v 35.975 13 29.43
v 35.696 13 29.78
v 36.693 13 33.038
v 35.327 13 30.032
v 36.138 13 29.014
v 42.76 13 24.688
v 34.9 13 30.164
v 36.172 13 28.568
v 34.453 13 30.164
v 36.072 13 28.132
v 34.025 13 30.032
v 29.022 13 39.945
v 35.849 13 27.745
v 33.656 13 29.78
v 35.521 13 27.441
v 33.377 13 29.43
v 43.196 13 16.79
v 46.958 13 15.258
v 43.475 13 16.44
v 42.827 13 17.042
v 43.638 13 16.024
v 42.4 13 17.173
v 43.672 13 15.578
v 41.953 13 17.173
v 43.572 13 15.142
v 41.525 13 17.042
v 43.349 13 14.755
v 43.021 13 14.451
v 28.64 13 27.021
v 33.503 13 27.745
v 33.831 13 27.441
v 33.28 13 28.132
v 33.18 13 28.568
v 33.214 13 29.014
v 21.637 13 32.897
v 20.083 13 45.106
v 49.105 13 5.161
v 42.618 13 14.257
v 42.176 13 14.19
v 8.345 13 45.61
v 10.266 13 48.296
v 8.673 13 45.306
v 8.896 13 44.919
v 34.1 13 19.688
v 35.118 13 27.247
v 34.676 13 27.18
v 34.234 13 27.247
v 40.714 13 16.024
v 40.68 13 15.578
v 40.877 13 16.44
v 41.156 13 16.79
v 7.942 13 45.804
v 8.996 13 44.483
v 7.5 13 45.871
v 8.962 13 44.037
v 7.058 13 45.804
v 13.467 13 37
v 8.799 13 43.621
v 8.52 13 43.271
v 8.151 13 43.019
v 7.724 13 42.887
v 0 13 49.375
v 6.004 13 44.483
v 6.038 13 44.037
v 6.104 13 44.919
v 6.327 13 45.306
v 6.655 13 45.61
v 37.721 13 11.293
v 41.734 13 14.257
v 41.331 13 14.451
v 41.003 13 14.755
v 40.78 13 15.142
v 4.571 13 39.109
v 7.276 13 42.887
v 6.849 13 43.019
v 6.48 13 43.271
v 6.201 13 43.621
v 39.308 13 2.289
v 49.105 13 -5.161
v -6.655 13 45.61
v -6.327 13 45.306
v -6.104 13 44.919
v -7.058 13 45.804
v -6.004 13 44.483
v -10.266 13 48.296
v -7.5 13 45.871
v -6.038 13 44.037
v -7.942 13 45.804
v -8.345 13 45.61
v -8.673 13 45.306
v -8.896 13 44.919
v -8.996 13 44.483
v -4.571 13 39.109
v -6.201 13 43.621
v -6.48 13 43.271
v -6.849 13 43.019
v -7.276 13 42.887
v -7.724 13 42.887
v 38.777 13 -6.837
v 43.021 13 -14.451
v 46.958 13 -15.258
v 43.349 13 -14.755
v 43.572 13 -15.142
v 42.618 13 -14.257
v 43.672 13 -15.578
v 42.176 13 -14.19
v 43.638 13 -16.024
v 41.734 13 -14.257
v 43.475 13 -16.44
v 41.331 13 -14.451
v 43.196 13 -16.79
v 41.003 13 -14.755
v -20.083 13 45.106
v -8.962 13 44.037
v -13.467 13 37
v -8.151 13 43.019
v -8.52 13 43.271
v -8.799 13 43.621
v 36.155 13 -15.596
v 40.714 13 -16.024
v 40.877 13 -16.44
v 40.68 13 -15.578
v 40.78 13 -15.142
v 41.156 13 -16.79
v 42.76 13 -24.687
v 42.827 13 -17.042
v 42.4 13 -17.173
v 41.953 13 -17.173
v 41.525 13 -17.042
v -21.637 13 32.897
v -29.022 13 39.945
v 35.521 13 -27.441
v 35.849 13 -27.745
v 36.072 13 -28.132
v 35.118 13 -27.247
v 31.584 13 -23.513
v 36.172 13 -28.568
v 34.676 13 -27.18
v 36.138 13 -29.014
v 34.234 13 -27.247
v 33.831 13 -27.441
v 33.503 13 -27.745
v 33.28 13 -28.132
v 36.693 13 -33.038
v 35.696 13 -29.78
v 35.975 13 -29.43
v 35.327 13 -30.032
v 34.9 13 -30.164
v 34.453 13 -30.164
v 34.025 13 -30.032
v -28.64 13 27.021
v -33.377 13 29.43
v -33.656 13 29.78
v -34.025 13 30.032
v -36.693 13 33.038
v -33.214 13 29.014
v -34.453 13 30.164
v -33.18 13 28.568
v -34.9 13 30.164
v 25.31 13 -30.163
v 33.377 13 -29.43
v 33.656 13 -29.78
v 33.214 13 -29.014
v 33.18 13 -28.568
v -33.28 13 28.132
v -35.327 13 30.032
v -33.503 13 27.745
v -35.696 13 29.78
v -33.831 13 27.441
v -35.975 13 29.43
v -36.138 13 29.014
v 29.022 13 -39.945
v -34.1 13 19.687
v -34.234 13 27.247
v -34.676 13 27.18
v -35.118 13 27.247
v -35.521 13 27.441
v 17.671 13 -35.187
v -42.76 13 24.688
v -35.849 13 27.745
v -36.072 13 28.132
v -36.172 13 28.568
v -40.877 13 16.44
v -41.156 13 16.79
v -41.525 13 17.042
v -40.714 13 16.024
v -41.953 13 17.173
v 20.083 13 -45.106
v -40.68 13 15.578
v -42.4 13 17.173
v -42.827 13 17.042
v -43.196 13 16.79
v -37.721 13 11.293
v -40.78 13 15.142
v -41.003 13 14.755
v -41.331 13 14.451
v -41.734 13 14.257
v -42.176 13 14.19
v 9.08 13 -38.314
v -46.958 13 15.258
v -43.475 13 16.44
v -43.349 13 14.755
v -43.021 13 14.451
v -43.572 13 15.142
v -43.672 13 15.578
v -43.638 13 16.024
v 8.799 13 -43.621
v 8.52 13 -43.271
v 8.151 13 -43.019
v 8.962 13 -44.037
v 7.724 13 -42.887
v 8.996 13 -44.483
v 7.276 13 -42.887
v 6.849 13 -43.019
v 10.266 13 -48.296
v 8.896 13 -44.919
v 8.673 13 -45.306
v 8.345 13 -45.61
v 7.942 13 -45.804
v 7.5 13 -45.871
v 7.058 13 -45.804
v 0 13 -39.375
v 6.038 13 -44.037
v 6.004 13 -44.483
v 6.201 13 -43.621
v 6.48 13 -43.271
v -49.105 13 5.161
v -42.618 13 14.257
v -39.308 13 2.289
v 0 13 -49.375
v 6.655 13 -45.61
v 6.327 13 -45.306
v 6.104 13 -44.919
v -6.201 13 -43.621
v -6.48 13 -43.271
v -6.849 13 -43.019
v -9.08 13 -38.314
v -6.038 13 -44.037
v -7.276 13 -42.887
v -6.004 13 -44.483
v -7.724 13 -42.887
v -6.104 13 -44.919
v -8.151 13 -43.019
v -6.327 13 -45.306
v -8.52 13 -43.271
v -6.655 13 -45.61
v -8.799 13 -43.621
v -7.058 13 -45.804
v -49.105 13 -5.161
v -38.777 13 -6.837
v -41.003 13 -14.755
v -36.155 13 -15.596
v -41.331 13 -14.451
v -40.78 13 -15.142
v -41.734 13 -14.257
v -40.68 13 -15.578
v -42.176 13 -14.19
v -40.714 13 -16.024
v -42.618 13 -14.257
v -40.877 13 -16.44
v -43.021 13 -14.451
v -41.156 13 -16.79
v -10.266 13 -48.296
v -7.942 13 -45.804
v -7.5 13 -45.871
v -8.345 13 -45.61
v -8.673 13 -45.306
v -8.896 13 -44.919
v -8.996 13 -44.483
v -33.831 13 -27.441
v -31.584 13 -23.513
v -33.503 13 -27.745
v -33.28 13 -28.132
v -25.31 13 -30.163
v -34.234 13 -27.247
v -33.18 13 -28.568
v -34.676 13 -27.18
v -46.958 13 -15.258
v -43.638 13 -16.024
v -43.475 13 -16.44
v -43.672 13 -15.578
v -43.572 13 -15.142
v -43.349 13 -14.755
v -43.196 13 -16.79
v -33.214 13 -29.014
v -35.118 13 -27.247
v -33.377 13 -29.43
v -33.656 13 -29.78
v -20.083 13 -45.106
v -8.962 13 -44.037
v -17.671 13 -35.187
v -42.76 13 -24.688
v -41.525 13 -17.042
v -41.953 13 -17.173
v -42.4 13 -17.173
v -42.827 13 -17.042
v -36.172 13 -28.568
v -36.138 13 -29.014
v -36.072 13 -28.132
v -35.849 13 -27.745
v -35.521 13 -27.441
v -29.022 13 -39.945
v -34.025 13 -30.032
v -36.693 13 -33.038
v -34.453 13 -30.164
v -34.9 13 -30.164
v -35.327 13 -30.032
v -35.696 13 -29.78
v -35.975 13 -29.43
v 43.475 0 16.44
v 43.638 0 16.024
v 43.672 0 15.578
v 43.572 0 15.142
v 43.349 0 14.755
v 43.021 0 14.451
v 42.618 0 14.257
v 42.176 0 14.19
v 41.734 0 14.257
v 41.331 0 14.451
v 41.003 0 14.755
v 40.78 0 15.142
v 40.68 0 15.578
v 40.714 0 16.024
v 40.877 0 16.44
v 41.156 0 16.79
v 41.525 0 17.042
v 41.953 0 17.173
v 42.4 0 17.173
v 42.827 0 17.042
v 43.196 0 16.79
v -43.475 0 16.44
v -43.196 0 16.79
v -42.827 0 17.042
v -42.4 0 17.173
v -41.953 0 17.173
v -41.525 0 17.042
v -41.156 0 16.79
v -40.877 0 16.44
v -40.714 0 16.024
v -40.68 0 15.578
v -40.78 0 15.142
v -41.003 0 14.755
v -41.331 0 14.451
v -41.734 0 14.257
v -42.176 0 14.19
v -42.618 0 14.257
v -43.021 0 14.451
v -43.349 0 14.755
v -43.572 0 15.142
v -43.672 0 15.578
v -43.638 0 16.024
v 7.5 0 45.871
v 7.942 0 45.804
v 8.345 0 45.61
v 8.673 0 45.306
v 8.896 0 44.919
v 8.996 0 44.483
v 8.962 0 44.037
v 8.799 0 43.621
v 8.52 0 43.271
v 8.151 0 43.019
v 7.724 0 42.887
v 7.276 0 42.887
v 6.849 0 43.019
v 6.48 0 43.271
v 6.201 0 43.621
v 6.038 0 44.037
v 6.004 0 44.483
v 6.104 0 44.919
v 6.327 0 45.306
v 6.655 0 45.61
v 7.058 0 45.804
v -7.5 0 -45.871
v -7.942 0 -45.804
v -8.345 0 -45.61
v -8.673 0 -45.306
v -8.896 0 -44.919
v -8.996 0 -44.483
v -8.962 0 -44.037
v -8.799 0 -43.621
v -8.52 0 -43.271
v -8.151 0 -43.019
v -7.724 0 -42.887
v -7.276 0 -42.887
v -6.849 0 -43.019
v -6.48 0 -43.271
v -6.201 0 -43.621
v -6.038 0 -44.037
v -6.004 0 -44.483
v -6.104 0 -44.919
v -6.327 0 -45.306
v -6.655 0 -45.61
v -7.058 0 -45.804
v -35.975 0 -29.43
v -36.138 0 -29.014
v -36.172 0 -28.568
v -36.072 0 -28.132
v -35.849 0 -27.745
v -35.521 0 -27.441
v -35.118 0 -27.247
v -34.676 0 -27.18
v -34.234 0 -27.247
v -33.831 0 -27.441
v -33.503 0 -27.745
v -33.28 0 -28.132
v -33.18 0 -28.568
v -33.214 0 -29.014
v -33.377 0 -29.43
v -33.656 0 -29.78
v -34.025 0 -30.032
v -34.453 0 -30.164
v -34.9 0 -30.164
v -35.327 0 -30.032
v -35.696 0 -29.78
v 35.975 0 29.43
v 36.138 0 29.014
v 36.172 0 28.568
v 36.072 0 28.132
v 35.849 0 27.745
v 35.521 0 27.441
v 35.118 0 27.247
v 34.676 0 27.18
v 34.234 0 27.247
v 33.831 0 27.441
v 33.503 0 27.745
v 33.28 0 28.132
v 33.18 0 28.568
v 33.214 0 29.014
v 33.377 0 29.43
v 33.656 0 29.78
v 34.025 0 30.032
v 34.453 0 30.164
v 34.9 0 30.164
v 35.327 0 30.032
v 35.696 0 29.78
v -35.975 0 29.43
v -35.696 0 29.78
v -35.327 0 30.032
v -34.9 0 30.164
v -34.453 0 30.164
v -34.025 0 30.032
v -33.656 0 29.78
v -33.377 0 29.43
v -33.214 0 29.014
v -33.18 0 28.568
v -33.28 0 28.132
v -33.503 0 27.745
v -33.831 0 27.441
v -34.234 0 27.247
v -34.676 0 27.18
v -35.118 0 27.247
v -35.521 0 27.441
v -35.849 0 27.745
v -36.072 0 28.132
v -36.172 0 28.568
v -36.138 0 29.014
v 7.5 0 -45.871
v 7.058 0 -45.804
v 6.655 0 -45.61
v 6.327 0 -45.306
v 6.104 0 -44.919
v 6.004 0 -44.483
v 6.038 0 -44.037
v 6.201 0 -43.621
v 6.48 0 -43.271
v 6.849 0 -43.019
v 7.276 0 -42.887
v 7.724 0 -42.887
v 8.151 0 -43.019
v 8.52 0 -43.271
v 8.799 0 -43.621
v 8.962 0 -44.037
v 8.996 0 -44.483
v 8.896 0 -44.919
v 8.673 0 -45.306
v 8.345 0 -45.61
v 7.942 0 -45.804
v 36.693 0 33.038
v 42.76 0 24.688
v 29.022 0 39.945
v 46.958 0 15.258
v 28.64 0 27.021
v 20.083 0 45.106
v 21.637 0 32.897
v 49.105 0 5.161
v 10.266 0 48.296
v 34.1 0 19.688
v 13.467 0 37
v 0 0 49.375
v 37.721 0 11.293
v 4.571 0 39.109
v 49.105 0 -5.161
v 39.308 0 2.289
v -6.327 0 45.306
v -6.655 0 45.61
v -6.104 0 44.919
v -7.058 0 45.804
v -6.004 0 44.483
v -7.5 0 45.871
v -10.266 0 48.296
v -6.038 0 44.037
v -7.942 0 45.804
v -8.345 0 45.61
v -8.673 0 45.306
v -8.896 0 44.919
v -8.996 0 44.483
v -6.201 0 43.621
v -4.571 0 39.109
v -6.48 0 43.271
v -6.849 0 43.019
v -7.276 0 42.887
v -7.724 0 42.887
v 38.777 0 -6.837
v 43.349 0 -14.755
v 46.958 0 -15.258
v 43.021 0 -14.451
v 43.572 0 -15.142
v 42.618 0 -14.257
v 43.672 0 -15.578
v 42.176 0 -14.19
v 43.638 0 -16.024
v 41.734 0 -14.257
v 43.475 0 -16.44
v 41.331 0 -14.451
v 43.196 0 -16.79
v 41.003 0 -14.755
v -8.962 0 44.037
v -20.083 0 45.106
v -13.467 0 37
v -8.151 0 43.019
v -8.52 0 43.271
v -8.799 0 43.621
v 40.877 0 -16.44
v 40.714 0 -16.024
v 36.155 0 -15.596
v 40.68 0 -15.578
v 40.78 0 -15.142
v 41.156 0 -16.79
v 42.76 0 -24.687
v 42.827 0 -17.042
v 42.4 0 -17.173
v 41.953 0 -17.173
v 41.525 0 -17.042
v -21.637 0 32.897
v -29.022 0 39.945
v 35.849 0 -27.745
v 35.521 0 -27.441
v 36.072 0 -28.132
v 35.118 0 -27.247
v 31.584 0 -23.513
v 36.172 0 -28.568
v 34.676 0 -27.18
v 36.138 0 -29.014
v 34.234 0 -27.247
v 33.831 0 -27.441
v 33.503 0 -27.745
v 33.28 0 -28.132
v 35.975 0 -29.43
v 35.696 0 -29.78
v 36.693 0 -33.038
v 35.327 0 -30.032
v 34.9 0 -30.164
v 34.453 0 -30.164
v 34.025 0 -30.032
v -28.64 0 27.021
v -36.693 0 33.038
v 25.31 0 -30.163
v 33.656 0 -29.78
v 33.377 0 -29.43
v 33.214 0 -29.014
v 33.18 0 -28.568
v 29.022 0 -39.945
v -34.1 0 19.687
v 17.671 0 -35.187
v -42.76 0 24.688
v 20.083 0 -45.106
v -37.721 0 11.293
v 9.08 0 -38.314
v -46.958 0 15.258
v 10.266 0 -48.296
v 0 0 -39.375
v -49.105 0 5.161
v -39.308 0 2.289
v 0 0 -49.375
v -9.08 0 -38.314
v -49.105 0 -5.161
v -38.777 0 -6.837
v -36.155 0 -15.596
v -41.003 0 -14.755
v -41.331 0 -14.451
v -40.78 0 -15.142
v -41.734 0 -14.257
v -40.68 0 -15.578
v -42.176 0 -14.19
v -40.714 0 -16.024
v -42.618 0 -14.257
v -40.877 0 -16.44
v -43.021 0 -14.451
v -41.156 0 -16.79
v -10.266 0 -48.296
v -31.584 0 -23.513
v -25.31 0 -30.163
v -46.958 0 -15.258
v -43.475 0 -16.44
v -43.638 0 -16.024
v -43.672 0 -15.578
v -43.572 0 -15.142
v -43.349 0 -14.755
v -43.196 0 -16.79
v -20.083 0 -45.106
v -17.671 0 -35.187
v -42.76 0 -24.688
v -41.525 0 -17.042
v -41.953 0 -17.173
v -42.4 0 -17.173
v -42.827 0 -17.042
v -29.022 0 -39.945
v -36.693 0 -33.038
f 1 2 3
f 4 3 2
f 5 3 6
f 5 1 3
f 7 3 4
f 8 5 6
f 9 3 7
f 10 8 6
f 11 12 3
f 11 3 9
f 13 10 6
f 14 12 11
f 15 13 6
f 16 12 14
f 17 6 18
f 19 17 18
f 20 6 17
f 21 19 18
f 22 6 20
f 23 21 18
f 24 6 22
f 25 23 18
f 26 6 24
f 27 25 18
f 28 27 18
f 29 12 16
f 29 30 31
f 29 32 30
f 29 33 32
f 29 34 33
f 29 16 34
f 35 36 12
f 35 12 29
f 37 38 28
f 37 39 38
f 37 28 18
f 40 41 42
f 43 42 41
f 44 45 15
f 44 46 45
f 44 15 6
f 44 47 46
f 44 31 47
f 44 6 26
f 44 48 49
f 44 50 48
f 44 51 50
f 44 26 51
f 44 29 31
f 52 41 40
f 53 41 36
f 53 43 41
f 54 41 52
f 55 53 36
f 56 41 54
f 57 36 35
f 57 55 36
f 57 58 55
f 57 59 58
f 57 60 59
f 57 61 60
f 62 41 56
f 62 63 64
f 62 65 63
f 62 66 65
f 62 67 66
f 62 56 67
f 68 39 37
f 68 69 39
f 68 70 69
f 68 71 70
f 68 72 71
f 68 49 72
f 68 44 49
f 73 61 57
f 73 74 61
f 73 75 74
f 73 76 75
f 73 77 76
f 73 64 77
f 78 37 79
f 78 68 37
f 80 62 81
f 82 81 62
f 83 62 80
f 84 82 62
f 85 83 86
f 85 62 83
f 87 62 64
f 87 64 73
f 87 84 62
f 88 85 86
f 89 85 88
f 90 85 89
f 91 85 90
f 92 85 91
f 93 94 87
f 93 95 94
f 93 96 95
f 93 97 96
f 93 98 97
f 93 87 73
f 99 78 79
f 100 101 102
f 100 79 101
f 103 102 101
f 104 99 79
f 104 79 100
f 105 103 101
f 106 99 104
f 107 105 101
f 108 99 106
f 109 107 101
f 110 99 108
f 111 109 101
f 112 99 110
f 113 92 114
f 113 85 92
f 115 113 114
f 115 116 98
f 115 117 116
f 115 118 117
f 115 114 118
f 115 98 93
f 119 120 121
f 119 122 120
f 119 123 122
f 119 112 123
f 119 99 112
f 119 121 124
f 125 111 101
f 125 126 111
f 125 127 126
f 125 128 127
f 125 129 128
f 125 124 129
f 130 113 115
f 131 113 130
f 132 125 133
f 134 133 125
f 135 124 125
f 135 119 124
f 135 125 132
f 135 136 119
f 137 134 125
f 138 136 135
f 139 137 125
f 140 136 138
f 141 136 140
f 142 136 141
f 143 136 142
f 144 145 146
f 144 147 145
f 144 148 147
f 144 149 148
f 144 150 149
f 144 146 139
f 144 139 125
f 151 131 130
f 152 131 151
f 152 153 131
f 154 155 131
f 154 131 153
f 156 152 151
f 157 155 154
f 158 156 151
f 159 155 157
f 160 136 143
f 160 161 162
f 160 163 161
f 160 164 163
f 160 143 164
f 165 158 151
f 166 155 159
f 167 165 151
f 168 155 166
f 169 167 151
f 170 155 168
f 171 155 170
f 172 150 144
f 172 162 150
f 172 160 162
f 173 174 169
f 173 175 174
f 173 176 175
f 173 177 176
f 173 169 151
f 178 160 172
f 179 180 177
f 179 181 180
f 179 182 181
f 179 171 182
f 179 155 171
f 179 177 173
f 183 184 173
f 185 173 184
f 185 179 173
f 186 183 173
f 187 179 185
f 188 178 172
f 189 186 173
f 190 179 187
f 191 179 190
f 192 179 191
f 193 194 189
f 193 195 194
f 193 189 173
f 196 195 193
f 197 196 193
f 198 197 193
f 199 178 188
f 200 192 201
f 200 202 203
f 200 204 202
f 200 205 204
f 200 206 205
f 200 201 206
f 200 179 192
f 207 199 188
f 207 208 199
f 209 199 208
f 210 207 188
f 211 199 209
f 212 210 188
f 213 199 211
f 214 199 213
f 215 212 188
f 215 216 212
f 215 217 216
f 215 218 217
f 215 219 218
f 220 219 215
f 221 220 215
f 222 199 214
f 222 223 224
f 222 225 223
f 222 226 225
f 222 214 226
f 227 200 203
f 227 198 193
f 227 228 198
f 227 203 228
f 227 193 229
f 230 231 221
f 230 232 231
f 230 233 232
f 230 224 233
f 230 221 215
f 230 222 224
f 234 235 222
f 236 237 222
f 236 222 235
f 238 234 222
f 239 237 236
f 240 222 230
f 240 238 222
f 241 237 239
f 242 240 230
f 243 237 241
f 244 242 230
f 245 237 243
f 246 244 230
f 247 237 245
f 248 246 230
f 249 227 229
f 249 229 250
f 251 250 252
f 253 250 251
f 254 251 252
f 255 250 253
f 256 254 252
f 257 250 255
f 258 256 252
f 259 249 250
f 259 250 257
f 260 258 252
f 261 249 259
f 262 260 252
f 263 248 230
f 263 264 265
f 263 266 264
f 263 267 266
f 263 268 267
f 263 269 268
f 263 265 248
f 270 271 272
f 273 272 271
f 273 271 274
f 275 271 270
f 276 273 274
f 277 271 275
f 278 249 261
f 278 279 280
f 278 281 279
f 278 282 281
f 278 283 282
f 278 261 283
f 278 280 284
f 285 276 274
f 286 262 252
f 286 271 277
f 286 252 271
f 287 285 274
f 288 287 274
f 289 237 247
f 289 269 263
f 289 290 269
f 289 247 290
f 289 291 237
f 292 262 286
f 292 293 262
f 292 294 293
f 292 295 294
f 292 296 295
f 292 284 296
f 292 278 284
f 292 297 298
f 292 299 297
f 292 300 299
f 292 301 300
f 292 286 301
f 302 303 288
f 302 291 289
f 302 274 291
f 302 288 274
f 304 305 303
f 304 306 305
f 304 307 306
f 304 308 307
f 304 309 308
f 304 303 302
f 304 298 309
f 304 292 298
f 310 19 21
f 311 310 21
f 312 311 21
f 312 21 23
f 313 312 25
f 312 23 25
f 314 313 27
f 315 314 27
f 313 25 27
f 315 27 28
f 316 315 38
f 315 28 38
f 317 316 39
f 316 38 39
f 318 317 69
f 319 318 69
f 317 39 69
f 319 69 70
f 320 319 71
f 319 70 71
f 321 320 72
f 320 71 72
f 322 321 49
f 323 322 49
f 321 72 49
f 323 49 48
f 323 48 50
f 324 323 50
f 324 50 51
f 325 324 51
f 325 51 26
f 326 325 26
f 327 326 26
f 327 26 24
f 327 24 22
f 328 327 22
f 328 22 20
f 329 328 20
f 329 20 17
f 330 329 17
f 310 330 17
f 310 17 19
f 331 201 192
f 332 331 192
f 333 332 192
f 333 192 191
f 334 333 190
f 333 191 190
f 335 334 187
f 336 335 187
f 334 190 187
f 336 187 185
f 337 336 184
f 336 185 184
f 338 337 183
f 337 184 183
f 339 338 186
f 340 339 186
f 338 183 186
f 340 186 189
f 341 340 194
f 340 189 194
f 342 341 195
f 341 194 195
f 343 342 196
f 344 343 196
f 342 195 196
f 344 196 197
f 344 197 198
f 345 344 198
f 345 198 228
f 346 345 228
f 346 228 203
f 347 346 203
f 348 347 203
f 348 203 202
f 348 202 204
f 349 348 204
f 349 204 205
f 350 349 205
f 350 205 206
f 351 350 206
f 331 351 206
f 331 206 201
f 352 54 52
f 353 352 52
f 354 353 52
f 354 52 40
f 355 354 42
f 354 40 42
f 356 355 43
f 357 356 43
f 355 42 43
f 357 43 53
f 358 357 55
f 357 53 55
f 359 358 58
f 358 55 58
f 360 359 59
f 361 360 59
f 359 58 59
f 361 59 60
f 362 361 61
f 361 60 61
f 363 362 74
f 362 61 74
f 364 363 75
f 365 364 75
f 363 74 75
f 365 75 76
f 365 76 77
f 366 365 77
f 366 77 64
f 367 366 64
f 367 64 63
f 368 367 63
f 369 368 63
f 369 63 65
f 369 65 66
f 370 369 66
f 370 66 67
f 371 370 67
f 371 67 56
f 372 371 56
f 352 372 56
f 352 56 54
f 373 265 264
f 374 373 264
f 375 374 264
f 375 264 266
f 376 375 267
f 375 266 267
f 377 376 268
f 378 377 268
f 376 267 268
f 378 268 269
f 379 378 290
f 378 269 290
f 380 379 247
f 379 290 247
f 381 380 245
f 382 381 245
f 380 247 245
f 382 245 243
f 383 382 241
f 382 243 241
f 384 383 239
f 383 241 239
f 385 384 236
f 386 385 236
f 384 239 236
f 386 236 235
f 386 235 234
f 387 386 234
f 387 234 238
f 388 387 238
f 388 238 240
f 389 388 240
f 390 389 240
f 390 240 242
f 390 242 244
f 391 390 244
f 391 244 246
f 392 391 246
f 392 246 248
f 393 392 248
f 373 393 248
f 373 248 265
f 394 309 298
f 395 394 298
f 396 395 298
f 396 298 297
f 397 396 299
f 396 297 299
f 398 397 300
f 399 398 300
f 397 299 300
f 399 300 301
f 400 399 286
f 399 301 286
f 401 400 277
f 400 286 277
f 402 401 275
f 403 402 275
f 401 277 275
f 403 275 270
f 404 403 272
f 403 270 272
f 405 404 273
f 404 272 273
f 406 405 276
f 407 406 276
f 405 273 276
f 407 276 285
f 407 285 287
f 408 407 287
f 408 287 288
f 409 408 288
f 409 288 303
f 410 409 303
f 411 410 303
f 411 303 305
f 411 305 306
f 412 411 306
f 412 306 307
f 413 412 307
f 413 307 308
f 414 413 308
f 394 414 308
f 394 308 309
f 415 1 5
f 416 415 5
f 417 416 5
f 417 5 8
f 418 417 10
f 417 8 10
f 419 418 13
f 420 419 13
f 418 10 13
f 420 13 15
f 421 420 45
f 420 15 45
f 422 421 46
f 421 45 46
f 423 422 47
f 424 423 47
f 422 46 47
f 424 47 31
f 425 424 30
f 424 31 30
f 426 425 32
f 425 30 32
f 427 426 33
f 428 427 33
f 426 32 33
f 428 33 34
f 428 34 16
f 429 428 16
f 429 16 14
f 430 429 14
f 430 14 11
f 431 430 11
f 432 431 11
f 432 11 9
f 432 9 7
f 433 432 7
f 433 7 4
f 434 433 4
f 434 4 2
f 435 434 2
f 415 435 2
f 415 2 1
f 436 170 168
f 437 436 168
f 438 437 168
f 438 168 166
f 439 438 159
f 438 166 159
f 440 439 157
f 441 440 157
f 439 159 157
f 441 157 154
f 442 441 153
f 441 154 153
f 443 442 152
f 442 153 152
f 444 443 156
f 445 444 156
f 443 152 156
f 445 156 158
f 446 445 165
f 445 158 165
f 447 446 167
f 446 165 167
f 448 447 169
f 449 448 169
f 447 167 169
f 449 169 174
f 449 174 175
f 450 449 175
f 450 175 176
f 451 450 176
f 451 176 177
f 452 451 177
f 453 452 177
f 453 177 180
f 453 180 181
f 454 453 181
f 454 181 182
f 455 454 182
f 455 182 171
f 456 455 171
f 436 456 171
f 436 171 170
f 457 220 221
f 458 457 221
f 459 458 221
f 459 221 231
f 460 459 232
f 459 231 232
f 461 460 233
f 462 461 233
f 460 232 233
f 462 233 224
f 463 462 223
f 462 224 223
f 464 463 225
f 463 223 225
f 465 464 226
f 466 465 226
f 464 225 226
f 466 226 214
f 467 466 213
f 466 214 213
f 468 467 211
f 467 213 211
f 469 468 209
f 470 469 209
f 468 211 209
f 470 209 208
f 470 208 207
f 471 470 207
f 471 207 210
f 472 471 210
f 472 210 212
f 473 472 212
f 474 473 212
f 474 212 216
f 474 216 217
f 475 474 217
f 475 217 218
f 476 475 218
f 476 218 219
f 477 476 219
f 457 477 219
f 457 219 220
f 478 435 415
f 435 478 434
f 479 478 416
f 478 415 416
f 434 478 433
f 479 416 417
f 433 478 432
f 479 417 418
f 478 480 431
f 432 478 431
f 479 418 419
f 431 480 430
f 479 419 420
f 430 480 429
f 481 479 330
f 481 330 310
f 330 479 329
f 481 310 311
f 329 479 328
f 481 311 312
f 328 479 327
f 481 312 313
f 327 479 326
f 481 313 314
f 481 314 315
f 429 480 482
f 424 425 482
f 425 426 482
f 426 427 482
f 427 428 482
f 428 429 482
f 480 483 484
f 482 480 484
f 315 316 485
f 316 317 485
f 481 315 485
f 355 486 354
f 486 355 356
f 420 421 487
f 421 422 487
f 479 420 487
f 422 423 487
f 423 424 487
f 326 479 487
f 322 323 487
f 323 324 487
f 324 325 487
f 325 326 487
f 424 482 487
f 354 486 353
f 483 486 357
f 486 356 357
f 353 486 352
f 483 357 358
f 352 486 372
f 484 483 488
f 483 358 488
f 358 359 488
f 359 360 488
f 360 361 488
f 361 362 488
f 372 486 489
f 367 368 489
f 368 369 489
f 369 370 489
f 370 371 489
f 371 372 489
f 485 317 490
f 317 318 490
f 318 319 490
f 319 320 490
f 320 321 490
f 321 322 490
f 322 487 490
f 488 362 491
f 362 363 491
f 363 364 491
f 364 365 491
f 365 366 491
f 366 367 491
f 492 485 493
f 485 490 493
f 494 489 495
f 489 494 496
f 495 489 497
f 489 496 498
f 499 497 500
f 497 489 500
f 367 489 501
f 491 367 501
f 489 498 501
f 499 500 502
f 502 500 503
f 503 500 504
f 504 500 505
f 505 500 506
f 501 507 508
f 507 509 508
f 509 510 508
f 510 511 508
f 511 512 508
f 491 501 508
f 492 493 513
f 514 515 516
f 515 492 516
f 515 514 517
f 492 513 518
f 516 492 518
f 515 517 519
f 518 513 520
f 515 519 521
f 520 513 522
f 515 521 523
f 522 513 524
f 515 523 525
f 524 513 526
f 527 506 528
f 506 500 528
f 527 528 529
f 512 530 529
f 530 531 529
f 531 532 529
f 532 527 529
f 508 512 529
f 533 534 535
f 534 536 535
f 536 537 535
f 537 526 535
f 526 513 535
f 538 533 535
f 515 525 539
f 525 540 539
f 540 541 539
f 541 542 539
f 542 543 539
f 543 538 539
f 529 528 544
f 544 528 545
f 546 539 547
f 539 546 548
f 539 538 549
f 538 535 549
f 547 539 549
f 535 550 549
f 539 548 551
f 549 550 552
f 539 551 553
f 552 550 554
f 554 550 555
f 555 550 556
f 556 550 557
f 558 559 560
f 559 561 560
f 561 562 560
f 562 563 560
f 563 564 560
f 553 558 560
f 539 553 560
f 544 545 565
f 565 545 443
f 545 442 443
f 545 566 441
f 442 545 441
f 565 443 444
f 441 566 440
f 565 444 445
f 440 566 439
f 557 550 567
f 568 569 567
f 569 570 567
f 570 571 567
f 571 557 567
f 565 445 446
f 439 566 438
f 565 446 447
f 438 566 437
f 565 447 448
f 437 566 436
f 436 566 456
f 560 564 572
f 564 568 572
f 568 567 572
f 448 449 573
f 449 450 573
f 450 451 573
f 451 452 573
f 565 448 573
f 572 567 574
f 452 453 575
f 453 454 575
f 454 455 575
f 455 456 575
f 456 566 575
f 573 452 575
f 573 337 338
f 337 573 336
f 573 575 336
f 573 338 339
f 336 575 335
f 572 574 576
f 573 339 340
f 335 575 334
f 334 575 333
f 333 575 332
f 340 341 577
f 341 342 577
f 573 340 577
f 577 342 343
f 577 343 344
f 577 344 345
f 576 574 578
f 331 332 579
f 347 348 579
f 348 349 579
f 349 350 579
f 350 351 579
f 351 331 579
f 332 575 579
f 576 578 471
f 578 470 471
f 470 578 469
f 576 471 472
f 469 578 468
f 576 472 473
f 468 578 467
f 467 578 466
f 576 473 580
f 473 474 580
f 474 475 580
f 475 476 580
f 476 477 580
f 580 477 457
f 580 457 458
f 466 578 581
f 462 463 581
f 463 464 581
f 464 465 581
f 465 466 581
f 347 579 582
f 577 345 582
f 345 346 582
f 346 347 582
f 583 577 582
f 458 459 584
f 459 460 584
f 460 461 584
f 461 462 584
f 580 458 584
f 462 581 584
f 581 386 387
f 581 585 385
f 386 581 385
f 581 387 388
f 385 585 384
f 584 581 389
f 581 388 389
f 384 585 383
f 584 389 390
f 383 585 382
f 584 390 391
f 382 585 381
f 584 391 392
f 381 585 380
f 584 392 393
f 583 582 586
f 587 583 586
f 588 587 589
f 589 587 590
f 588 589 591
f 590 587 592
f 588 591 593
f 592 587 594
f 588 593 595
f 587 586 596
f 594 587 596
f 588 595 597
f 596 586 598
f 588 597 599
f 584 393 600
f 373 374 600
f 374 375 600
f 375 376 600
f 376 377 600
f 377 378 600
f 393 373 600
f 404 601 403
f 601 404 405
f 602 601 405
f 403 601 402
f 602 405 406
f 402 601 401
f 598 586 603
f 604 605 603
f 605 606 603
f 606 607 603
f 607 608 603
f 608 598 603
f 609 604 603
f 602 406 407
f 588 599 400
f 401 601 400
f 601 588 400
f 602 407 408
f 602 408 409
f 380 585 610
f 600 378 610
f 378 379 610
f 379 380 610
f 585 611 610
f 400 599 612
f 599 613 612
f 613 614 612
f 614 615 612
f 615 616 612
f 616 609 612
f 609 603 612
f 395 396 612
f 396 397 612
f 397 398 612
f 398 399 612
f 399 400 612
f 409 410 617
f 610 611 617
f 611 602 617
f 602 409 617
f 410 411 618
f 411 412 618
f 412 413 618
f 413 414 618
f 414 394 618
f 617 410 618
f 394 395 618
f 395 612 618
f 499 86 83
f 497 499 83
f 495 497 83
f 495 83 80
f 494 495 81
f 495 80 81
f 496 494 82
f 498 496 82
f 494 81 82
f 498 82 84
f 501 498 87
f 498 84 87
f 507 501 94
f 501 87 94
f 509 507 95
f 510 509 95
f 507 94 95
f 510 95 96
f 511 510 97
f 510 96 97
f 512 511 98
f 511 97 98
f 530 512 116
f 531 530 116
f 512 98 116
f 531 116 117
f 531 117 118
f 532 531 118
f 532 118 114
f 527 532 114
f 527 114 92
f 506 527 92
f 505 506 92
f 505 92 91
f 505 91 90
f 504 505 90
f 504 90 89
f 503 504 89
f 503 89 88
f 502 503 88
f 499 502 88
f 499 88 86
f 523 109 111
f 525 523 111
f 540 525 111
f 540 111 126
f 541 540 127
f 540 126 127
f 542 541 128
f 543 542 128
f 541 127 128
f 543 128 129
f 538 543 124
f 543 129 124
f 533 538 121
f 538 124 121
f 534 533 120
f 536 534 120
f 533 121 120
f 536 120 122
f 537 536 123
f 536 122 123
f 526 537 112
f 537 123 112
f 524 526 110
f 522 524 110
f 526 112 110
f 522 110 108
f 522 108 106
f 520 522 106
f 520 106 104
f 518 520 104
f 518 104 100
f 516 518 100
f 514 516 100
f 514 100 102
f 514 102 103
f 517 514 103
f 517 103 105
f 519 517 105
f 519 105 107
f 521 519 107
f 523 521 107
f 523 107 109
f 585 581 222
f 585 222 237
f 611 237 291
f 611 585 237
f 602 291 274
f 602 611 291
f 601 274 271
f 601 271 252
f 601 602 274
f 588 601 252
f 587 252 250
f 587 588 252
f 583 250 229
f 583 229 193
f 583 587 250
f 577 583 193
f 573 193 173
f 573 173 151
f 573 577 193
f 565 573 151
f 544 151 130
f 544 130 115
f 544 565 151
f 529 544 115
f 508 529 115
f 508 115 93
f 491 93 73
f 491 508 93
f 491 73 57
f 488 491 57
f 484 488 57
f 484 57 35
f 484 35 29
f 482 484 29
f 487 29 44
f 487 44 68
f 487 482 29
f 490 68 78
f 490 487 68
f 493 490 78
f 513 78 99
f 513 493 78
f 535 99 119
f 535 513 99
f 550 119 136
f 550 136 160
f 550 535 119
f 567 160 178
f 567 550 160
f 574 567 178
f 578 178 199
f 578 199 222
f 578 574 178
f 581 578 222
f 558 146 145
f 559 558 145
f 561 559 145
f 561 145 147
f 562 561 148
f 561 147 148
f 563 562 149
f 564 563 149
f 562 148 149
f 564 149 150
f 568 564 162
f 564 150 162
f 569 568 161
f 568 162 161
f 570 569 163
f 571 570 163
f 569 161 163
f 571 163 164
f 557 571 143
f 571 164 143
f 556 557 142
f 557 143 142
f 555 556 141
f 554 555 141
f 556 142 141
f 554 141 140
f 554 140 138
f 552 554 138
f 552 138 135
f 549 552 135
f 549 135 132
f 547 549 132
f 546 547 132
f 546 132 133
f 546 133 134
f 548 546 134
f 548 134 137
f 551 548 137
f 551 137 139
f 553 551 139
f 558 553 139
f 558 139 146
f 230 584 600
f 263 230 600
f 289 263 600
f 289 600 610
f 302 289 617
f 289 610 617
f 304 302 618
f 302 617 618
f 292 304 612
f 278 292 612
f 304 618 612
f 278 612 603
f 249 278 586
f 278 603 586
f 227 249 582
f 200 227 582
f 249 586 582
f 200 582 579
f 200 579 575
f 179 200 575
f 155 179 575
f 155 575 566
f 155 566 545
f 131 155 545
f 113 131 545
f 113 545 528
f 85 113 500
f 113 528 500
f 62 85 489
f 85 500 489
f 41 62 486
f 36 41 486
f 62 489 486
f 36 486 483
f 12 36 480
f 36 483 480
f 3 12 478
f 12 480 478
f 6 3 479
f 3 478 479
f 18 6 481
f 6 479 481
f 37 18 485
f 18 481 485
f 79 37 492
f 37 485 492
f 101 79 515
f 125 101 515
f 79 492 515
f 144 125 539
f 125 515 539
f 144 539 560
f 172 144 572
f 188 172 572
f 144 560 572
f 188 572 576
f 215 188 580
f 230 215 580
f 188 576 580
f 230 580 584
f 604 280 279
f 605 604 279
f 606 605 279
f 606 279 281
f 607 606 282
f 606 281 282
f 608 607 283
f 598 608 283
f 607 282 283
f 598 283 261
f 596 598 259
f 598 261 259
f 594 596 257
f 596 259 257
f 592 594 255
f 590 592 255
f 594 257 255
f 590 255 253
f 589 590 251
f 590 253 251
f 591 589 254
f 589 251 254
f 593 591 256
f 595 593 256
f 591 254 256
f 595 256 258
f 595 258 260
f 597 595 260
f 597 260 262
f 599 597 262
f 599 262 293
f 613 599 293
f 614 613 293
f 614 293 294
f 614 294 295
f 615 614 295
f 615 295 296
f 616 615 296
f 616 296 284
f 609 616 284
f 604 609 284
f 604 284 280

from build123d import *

# Parameters (mm, degrees)
SKETCH1_R           = 49.375
SKETCH1_R_2         = 39.375
BOSS_EXTRUDE1_DEPTH = 13
CUT_EXTRUDE1_REACH  = 73.027
SKETCH2_R           = 1.5
CIRPATTERN1_COUNT   = 6


with BuildPart() as part:
    # Sketch1 → Boss-Extrude1 (new body)
    with BuildSketch(Plane(origin=(0, 0, 0), x_dir=(1, 0, 0), z_dir=(0, 1, 0))):
        with Locations(Location((0, 0, 0), (0, 0, 90))):
            Circle(SKETCH1_R)
        with Locations(Location((0, 0, 0), (0, 0, 90))):
            Circle(SKETCH1_R_2, mode=Mode.SUBTRACT)
    extrude(amount=BOSS_EXTRUDE1_DEPTH)

    # Sketch2 → Cut-Extrude1 (cut, up to next)
    with BuildSketch(Plane(origin=(0, 13, 0), x_dir=(1, 0, 0), z_dir=(0, 1, 0)), mode=Mode.PRIVATE) as cut_extrude1_sk1:
        with Locations(Location((-7.5, -44.370598373, 0), (0, 0, 270))):
            Circle(SKETCH2_R)
    cut_extrude1_tool1 = extrude(cut_extrude1_sk1.sketch, amount=-CUT_EXTRUDE1_REACH, mode=Mode.PRIVATE) & part.part
    # Sketch2 → Cut-Extrude1 (cut, up to next)
    with BuildSketch(Plane(origin=(0, 13, 0), x_dir=(1, 0, 0), z_dir=(0, 1, 0)), mode=Mode.PRIVATE) as cut_extrude1_sk2:
        with Locations(Location((7.5, -44.370598373, 0), (0, 0, 270))):
            Circle(SKETCH2_R)
    cut_extrude1_tool2 = extrude(cut_extrude1_sk2.sketch, amount=-CUT_EXTRUDE1_REACH, mode=Mode.PRIVATE) & part.part
    cut_extrude1_1 = cut_extrude1_tool1.solids().sort_by_distance((-7.5, 13, 44.370598))[0]
    add(cut_extrude1_1, mode=Mode.SUBTRACT)
    cut_extrude1_2 = cut_extrude1_tool2.solids().sort_by_distance((7.5, 13, 44.370598))[0]
    add(cut_extrude1_2, mode=Mode.SUBTRACT)
    cut_extrude1 = cut_extrude1_1 + cut_extrude1_2  # Cut-Extrude1 as one shape, for the pattern or mirror that repeats it

    # CirPattern1: Cut-Extrude1 ×6 about axis
    cirpattern1_axis = Axis((0, 0, 0), (0, 1, 0))
    for i in range(1, CIRPATTERN1_COUNT):
        add(cut_extrude1.rotate(cirpattern1_axis, i * 360 / CIRPATTERN1_COUNT), mode=Mode.SUBTRACT)


solid = part.part
